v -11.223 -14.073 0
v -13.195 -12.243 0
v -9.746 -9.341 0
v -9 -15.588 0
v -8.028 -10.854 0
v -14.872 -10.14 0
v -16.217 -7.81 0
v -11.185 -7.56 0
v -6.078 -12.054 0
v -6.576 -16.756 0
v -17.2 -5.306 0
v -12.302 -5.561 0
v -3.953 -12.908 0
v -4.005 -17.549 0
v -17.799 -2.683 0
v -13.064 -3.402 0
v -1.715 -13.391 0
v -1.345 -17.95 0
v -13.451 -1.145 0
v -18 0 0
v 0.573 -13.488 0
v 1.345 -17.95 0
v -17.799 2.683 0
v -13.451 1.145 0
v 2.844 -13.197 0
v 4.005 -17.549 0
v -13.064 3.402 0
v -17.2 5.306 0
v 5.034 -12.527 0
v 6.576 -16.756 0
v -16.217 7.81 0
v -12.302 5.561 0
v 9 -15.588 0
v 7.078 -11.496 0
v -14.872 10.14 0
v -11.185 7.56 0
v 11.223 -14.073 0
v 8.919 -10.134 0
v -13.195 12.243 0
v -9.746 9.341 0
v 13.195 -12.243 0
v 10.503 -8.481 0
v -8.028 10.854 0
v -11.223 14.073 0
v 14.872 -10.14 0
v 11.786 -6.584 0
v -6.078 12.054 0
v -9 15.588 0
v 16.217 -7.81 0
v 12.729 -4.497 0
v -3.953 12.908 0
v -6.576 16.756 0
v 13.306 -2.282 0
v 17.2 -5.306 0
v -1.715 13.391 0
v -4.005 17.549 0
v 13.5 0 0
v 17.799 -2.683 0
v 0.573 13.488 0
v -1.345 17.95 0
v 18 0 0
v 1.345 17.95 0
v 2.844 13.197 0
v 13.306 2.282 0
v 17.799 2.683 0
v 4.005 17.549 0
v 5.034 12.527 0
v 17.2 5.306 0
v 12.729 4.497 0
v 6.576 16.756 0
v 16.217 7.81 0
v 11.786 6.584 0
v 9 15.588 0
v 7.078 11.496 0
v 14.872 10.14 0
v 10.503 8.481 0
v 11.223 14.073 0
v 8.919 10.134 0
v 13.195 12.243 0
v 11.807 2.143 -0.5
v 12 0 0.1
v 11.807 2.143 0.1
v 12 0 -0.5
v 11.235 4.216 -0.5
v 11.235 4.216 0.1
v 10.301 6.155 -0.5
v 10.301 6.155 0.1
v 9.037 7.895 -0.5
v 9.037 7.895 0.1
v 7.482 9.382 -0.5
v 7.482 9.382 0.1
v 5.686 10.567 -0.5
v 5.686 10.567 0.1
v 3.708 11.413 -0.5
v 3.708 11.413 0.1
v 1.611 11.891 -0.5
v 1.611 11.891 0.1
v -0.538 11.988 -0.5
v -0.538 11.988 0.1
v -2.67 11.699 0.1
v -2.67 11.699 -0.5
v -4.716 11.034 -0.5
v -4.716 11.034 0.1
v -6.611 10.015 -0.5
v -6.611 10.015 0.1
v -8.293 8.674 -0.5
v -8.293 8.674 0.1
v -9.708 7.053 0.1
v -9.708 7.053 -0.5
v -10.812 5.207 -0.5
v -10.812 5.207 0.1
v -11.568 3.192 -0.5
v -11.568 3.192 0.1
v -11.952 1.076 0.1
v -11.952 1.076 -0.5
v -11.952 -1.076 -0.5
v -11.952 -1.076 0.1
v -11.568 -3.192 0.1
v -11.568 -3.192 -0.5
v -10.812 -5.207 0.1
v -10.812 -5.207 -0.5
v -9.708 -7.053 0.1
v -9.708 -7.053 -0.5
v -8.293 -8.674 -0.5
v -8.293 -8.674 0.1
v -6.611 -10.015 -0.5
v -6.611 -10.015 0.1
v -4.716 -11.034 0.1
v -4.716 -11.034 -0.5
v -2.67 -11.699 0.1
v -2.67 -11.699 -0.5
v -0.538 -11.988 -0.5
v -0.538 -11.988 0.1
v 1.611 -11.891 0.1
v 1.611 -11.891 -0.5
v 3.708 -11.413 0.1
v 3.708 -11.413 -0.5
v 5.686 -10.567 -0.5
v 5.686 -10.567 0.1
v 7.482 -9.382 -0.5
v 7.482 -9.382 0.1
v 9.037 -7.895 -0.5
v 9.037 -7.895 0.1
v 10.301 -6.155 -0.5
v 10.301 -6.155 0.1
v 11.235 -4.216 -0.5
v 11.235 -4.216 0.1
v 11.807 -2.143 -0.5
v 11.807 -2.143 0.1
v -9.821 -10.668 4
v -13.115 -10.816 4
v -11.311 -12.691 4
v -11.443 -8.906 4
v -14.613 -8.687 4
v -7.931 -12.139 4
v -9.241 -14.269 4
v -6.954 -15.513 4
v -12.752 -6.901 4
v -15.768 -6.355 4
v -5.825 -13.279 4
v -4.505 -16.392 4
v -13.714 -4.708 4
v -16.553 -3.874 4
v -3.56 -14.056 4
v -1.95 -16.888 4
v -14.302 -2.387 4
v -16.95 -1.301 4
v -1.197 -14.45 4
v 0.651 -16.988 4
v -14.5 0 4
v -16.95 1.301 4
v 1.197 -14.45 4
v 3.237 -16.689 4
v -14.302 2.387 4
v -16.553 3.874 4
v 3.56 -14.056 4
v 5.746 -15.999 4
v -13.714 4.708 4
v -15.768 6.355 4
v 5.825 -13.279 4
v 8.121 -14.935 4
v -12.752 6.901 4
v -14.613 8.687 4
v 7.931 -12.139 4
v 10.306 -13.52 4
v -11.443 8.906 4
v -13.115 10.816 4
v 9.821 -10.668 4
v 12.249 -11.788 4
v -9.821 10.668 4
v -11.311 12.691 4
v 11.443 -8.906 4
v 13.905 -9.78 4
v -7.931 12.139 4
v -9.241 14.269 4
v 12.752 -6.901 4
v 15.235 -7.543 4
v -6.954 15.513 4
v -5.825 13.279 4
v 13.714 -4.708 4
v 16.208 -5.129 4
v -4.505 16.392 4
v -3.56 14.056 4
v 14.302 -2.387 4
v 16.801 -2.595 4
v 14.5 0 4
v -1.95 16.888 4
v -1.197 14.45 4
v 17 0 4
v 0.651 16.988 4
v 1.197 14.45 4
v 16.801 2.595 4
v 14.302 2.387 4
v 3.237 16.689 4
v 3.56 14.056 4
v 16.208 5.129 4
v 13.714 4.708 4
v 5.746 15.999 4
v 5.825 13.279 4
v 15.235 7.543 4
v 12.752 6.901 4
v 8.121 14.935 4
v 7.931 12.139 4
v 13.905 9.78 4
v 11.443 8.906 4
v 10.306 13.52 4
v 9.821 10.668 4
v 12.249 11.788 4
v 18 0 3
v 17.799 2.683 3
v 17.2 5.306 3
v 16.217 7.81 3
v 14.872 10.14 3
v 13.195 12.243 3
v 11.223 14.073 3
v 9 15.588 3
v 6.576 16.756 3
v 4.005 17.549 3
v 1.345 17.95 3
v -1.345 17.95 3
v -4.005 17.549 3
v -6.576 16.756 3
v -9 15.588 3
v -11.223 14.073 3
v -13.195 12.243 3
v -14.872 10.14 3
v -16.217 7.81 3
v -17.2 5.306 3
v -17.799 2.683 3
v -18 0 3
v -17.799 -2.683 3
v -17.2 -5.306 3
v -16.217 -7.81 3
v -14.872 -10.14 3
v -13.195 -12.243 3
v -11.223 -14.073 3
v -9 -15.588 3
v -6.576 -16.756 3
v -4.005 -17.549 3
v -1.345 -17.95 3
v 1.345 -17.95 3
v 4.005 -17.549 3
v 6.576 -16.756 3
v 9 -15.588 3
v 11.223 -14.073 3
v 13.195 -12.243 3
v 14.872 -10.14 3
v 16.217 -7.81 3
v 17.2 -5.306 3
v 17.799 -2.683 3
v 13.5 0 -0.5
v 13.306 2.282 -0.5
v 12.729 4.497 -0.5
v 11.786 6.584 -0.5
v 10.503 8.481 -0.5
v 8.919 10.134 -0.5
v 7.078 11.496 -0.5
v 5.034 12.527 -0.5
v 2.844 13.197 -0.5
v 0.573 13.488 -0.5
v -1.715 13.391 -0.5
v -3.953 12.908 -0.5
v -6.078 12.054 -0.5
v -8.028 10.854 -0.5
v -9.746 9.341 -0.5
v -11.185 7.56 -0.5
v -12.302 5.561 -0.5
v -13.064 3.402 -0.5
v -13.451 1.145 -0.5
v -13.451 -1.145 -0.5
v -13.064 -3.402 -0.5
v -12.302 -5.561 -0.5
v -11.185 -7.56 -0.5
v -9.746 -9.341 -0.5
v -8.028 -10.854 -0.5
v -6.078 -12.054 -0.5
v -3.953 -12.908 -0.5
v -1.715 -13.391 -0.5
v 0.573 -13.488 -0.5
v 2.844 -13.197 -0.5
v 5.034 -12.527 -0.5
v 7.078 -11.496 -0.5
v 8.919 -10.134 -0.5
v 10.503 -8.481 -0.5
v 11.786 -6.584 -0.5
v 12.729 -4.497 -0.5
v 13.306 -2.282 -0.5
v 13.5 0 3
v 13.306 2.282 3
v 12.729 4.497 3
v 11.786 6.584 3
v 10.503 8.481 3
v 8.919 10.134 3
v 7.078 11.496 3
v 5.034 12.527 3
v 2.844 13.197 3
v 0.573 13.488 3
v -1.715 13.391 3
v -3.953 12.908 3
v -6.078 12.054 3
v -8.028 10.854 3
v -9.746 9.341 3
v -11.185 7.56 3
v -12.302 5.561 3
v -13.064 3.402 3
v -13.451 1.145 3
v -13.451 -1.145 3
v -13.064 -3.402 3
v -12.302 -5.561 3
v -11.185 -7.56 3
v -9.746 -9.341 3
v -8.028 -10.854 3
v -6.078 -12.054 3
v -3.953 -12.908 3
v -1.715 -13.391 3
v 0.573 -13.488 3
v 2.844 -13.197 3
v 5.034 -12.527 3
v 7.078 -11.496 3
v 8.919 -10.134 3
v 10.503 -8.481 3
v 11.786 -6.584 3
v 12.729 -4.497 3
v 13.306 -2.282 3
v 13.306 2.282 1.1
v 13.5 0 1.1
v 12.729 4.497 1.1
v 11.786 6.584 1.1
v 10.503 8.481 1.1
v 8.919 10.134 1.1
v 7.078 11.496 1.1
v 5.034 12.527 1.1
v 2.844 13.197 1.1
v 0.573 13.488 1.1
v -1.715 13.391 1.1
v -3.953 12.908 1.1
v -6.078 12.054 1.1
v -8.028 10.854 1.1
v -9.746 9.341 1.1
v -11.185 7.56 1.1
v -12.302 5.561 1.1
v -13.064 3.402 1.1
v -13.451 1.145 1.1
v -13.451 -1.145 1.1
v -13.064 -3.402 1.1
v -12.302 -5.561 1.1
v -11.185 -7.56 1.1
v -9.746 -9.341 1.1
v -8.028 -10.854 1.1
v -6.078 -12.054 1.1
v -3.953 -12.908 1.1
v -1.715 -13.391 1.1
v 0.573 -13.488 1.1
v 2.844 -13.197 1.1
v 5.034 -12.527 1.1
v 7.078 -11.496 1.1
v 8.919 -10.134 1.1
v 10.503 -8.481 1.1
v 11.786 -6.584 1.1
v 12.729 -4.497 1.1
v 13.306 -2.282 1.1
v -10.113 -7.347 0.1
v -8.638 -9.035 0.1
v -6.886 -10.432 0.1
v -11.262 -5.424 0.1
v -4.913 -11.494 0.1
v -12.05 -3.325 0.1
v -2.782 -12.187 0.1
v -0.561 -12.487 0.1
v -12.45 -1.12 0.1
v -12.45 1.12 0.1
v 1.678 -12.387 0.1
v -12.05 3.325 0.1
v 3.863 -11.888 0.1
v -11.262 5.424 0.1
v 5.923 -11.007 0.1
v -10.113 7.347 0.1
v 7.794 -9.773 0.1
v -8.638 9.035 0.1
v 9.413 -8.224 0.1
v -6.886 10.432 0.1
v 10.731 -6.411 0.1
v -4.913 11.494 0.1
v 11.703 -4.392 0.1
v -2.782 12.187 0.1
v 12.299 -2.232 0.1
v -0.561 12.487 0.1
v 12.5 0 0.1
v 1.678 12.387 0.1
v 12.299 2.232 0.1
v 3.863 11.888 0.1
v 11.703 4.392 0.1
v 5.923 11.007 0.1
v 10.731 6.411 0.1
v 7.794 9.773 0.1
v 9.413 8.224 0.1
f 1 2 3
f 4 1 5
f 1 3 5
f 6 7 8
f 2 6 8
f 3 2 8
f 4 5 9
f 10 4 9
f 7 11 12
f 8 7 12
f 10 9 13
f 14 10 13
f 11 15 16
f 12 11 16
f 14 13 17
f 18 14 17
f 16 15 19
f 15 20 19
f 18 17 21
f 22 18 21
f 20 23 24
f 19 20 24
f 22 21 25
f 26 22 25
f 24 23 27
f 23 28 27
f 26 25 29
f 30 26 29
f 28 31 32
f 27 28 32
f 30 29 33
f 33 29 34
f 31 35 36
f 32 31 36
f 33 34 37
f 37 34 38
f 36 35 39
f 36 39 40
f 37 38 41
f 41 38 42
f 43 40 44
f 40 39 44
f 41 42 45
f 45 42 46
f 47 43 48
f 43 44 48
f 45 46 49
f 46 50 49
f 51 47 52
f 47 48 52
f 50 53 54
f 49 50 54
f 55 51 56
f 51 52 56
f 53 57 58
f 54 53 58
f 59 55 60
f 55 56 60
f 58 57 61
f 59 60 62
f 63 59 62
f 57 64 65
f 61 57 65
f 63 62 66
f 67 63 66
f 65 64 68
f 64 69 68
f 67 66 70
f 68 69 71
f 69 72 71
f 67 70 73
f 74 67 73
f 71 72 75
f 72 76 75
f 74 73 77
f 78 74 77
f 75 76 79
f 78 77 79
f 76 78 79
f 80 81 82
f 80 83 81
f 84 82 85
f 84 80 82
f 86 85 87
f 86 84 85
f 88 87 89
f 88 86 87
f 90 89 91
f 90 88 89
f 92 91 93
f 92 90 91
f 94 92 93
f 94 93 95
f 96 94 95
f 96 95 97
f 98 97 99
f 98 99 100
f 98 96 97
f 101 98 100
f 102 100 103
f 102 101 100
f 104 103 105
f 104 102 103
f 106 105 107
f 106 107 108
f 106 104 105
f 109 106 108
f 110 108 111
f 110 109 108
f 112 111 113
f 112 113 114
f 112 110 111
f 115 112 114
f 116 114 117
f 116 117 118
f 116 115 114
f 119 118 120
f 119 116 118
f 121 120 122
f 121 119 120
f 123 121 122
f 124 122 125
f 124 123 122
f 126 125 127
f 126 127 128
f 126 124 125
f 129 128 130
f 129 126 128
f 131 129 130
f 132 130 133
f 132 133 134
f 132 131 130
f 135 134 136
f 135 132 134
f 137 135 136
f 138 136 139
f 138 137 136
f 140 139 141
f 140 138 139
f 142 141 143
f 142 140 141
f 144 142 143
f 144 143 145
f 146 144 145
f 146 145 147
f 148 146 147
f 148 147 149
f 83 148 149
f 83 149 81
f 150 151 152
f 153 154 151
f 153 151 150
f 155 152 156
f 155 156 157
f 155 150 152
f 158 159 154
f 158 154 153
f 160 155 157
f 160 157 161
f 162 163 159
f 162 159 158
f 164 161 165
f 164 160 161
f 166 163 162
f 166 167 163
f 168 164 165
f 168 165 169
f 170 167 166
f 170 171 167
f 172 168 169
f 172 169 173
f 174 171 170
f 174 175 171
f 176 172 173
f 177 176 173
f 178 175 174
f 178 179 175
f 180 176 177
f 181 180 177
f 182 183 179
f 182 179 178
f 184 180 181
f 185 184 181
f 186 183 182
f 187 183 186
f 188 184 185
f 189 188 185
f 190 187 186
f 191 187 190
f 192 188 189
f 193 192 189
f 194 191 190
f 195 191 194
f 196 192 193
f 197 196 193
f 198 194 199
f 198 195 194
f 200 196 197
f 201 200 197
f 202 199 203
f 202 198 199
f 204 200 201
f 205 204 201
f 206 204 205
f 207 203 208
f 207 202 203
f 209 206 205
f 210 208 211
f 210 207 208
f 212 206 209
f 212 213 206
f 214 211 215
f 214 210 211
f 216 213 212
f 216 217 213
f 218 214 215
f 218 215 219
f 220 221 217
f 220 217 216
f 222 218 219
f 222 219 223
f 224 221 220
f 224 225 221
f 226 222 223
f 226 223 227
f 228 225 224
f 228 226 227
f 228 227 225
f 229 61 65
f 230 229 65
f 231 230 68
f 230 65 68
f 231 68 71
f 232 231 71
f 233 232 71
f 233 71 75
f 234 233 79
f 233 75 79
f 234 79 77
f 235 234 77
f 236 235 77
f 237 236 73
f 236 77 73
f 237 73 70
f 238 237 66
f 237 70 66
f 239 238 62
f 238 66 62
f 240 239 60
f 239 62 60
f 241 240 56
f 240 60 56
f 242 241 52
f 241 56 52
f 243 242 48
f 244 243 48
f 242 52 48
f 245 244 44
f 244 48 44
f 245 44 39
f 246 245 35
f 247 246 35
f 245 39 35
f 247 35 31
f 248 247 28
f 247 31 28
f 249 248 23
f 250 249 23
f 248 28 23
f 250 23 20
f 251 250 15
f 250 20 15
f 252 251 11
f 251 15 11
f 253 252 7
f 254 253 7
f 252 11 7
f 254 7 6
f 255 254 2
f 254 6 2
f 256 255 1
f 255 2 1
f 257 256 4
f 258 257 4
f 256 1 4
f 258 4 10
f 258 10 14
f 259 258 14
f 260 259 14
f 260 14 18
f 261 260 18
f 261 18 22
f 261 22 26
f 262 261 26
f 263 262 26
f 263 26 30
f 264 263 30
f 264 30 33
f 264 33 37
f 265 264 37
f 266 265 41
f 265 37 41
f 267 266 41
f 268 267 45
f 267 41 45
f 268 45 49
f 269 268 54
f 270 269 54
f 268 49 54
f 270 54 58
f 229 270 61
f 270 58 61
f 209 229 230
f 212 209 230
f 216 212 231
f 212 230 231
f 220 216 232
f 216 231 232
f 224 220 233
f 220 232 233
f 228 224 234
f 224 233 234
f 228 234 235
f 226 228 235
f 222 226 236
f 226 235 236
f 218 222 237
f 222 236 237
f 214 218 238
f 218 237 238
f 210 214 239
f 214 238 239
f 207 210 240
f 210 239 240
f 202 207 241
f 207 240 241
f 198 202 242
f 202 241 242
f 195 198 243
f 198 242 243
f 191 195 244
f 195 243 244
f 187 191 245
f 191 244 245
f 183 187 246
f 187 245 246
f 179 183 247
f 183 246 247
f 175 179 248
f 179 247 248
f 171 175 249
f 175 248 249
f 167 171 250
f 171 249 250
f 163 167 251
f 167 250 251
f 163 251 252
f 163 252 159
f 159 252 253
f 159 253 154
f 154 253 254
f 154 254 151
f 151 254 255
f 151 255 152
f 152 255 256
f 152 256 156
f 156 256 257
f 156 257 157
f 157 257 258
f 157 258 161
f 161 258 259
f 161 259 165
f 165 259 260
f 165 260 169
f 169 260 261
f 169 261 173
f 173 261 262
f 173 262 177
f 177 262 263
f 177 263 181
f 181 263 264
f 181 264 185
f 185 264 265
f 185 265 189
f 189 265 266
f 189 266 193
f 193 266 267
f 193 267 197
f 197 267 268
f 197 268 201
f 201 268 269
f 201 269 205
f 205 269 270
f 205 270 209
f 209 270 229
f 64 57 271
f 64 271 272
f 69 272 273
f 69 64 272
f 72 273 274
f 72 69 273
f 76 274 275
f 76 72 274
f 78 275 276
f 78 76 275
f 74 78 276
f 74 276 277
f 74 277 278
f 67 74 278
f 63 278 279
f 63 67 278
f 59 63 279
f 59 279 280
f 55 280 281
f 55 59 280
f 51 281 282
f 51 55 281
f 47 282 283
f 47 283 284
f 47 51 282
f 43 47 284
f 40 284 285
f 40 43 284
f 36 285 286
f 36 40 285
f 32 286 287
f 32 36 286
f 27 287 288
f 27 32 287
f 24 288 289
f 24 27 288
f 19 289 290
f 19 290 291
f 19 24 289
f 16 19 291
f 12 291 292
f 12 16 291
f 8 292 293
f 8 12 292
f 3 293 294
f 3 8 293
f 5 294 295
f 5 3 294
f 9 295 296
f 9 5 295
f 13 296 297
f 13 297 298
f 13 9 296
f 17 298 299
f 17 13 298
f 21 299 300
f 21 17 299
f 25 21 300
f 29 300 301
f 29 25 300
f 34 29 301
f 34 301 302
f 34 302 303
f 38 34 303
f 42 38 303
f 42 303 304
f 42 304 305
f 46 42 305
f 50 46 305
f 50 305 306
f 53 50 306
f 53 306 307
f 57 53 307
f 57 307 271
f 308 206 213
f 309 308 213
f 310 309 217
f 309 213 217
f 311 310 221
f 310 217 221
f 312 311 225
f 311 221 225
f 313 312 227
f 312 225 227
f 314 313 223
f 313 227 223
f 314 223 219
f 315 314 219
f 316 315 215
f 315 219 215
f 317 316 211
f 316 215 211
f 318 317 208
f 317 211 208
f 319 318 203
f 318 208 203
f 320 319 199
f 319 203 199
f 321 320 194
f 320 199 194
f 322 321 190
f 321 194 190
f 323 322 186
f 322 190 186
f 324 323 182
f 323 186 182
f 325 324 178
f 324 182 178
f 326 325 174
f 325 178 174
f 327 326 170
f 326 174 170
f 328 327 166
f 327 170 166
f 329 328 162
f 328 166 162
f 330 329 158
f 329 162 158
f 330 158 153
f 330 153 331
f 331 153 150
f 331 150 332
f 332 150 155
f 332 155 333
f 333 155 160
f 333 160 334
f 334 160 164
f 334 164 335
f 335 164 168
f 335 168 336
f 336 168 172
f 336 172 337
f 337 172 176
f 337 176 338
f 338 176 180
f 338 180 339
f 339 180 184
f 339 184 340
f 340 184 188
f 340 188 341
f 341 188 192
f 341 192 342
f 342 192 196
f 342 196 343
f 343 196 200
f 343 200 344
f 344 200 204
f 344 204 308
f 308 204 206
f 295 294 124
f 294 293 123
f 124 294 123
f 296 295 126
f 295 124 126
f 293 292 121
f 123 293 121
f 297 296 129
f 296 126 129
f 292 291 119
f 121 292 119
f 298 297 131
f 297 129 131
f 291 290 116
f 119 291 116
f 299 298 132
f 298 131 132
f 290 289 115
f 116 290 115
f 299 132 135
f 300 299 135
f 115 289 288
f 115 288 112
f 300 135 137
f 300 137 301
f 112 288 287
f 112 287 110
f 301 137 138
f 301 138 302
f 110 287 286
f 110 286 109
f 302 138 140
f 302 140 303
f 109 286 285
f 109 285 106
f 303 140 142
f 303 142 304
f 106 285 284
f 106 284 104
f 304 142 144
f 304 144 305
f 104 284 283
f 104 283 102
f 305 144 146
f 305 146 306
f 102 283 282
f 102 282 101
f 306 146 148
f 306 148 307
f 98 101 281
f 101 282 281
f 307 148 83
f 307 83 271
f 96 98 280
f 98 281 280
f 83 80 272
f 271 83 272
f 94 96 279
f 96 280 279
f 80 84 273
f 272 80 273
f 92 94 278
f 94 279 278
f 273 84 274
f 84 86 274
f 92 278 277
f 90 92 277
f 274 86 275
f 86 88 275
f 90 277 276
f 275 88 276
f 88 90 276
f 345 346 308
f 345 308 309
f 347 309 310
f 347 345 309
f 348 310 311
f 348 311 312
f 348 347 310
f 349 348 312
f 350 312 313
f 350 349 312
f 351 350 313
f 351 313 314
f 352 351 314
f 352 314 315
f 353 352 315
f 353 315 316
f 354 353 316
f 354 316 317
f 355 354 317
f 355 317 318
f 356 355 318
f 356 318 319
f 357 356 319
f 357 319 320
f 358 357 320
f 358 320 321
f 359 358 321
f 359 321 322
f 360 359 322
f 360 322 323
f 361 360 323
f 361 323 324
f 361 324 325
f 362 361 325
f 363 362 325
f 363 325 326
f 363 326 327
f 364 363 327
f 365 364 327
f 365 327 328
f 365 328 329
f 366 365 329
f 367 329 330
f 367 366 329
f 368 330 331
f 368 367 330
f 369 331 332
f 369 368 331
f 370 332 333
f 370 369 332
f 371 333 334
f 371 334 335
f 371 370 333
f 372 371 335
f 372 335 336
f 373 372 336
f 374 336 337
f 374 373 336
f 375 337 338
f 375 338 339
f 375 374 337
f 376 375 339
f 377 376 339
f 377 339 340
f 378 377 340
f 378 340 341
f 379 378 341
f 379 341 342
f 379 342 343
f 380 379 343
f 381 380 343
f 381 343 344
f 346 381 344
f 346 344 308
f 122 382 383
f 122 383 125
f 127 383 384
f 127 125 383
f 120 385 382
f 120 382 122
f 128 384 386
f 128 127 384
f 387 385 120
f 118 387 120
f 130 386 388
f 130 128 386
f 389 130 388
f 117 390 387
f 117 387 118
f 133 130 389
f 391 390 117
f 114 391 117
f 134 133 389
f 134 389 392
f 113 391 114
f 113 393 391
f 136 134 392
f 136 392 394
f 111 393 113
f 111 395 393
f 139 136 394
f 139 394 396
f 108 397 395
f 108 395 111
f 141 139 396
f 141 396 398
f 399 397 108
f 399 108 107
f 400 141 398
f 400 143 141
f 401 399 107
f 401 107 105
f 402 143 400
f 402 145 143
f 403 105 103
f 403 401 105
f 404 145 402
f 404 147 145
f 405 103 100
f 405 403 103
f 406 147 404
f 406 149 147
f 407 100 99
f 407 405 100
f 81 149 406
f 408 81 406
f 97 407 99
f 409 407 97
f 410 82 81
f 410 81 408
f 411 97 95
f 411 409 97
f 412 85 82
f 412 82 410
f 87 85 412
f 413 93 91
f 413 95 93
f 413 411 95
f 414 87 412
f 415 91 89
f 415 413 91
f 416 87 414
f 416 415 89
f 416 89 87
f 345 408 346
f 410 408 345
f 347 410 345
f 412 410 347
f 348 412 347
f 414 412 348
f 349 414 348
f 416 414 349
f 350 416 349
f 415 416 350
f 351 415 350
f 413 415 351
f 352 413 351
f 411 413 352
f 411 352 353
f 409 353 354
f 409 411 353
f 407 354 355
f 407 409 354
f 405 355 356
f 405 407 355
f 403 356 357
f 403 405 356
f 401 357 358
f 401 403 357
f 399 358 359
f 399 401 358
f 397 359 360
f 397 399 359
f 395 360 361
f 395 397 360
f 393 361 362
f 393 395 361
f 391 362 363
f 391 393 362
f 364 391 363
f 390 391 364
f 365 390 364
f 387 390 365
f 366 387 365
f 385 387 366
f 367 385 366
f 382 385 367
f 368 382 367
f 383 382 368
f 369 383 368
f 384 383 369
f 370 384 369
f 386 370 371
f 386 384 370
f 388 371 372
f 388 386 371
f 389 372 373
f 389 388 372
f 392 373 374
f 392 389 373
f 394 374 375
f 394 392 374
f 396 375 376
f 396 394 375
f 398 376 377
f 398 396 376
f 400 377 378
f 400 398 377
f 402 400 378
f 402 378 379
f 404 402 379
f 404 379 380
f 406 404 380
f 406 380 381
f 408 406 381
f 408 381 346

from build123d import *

# Parameters (mm, degrees)
F0_R          = 18
F0_R_2        = 13.5
F1_DEPTH      = 4
F0_R_3        = 12
F2_DEPTH      = 0.5
F2_DEPTH_BACK = 0.1
F3_SIZE       = 1
F4_SIZE       = 1


with BuildPart() as f1:
    # F0 (on Top) → F1 (new body)
    with BuildSketch(Plane.XY):
        Circle(F0_R)
        Circle(F0_R_2, mode=Mode.SUBTRACT)
    extrude(amount=F1_DEPTH)

    # F0 (on Top) → F2 (join, two sides)
    with BuildSketch(Plane.XY) as f2_sk:
        Circle(F0_R_2)
        Circle(F0_R_3, mode=Mode.SUBTRACT)
    extrude(amount=-F2_DEPTH)
    extrude(f2_sk.sketch, amount=F2_DEPTH_BACK)

    # F3
    f3_edges = [f1.edges().sort_by_distance(p)[0] for p in [
        (-13.5, 0, 0.1),
    ]]
    chamfer(f3_edges, length=F3_SIZE)

    # F4
    f4_edges = [f1.edges().sort_by_distance(p)[0] for p in [
        (-18, 0, 4),
        (-13.5, 0, 4),
    ]]
    chamfer(f4_edges, length=F4_SIZE)


solid = f1.part
